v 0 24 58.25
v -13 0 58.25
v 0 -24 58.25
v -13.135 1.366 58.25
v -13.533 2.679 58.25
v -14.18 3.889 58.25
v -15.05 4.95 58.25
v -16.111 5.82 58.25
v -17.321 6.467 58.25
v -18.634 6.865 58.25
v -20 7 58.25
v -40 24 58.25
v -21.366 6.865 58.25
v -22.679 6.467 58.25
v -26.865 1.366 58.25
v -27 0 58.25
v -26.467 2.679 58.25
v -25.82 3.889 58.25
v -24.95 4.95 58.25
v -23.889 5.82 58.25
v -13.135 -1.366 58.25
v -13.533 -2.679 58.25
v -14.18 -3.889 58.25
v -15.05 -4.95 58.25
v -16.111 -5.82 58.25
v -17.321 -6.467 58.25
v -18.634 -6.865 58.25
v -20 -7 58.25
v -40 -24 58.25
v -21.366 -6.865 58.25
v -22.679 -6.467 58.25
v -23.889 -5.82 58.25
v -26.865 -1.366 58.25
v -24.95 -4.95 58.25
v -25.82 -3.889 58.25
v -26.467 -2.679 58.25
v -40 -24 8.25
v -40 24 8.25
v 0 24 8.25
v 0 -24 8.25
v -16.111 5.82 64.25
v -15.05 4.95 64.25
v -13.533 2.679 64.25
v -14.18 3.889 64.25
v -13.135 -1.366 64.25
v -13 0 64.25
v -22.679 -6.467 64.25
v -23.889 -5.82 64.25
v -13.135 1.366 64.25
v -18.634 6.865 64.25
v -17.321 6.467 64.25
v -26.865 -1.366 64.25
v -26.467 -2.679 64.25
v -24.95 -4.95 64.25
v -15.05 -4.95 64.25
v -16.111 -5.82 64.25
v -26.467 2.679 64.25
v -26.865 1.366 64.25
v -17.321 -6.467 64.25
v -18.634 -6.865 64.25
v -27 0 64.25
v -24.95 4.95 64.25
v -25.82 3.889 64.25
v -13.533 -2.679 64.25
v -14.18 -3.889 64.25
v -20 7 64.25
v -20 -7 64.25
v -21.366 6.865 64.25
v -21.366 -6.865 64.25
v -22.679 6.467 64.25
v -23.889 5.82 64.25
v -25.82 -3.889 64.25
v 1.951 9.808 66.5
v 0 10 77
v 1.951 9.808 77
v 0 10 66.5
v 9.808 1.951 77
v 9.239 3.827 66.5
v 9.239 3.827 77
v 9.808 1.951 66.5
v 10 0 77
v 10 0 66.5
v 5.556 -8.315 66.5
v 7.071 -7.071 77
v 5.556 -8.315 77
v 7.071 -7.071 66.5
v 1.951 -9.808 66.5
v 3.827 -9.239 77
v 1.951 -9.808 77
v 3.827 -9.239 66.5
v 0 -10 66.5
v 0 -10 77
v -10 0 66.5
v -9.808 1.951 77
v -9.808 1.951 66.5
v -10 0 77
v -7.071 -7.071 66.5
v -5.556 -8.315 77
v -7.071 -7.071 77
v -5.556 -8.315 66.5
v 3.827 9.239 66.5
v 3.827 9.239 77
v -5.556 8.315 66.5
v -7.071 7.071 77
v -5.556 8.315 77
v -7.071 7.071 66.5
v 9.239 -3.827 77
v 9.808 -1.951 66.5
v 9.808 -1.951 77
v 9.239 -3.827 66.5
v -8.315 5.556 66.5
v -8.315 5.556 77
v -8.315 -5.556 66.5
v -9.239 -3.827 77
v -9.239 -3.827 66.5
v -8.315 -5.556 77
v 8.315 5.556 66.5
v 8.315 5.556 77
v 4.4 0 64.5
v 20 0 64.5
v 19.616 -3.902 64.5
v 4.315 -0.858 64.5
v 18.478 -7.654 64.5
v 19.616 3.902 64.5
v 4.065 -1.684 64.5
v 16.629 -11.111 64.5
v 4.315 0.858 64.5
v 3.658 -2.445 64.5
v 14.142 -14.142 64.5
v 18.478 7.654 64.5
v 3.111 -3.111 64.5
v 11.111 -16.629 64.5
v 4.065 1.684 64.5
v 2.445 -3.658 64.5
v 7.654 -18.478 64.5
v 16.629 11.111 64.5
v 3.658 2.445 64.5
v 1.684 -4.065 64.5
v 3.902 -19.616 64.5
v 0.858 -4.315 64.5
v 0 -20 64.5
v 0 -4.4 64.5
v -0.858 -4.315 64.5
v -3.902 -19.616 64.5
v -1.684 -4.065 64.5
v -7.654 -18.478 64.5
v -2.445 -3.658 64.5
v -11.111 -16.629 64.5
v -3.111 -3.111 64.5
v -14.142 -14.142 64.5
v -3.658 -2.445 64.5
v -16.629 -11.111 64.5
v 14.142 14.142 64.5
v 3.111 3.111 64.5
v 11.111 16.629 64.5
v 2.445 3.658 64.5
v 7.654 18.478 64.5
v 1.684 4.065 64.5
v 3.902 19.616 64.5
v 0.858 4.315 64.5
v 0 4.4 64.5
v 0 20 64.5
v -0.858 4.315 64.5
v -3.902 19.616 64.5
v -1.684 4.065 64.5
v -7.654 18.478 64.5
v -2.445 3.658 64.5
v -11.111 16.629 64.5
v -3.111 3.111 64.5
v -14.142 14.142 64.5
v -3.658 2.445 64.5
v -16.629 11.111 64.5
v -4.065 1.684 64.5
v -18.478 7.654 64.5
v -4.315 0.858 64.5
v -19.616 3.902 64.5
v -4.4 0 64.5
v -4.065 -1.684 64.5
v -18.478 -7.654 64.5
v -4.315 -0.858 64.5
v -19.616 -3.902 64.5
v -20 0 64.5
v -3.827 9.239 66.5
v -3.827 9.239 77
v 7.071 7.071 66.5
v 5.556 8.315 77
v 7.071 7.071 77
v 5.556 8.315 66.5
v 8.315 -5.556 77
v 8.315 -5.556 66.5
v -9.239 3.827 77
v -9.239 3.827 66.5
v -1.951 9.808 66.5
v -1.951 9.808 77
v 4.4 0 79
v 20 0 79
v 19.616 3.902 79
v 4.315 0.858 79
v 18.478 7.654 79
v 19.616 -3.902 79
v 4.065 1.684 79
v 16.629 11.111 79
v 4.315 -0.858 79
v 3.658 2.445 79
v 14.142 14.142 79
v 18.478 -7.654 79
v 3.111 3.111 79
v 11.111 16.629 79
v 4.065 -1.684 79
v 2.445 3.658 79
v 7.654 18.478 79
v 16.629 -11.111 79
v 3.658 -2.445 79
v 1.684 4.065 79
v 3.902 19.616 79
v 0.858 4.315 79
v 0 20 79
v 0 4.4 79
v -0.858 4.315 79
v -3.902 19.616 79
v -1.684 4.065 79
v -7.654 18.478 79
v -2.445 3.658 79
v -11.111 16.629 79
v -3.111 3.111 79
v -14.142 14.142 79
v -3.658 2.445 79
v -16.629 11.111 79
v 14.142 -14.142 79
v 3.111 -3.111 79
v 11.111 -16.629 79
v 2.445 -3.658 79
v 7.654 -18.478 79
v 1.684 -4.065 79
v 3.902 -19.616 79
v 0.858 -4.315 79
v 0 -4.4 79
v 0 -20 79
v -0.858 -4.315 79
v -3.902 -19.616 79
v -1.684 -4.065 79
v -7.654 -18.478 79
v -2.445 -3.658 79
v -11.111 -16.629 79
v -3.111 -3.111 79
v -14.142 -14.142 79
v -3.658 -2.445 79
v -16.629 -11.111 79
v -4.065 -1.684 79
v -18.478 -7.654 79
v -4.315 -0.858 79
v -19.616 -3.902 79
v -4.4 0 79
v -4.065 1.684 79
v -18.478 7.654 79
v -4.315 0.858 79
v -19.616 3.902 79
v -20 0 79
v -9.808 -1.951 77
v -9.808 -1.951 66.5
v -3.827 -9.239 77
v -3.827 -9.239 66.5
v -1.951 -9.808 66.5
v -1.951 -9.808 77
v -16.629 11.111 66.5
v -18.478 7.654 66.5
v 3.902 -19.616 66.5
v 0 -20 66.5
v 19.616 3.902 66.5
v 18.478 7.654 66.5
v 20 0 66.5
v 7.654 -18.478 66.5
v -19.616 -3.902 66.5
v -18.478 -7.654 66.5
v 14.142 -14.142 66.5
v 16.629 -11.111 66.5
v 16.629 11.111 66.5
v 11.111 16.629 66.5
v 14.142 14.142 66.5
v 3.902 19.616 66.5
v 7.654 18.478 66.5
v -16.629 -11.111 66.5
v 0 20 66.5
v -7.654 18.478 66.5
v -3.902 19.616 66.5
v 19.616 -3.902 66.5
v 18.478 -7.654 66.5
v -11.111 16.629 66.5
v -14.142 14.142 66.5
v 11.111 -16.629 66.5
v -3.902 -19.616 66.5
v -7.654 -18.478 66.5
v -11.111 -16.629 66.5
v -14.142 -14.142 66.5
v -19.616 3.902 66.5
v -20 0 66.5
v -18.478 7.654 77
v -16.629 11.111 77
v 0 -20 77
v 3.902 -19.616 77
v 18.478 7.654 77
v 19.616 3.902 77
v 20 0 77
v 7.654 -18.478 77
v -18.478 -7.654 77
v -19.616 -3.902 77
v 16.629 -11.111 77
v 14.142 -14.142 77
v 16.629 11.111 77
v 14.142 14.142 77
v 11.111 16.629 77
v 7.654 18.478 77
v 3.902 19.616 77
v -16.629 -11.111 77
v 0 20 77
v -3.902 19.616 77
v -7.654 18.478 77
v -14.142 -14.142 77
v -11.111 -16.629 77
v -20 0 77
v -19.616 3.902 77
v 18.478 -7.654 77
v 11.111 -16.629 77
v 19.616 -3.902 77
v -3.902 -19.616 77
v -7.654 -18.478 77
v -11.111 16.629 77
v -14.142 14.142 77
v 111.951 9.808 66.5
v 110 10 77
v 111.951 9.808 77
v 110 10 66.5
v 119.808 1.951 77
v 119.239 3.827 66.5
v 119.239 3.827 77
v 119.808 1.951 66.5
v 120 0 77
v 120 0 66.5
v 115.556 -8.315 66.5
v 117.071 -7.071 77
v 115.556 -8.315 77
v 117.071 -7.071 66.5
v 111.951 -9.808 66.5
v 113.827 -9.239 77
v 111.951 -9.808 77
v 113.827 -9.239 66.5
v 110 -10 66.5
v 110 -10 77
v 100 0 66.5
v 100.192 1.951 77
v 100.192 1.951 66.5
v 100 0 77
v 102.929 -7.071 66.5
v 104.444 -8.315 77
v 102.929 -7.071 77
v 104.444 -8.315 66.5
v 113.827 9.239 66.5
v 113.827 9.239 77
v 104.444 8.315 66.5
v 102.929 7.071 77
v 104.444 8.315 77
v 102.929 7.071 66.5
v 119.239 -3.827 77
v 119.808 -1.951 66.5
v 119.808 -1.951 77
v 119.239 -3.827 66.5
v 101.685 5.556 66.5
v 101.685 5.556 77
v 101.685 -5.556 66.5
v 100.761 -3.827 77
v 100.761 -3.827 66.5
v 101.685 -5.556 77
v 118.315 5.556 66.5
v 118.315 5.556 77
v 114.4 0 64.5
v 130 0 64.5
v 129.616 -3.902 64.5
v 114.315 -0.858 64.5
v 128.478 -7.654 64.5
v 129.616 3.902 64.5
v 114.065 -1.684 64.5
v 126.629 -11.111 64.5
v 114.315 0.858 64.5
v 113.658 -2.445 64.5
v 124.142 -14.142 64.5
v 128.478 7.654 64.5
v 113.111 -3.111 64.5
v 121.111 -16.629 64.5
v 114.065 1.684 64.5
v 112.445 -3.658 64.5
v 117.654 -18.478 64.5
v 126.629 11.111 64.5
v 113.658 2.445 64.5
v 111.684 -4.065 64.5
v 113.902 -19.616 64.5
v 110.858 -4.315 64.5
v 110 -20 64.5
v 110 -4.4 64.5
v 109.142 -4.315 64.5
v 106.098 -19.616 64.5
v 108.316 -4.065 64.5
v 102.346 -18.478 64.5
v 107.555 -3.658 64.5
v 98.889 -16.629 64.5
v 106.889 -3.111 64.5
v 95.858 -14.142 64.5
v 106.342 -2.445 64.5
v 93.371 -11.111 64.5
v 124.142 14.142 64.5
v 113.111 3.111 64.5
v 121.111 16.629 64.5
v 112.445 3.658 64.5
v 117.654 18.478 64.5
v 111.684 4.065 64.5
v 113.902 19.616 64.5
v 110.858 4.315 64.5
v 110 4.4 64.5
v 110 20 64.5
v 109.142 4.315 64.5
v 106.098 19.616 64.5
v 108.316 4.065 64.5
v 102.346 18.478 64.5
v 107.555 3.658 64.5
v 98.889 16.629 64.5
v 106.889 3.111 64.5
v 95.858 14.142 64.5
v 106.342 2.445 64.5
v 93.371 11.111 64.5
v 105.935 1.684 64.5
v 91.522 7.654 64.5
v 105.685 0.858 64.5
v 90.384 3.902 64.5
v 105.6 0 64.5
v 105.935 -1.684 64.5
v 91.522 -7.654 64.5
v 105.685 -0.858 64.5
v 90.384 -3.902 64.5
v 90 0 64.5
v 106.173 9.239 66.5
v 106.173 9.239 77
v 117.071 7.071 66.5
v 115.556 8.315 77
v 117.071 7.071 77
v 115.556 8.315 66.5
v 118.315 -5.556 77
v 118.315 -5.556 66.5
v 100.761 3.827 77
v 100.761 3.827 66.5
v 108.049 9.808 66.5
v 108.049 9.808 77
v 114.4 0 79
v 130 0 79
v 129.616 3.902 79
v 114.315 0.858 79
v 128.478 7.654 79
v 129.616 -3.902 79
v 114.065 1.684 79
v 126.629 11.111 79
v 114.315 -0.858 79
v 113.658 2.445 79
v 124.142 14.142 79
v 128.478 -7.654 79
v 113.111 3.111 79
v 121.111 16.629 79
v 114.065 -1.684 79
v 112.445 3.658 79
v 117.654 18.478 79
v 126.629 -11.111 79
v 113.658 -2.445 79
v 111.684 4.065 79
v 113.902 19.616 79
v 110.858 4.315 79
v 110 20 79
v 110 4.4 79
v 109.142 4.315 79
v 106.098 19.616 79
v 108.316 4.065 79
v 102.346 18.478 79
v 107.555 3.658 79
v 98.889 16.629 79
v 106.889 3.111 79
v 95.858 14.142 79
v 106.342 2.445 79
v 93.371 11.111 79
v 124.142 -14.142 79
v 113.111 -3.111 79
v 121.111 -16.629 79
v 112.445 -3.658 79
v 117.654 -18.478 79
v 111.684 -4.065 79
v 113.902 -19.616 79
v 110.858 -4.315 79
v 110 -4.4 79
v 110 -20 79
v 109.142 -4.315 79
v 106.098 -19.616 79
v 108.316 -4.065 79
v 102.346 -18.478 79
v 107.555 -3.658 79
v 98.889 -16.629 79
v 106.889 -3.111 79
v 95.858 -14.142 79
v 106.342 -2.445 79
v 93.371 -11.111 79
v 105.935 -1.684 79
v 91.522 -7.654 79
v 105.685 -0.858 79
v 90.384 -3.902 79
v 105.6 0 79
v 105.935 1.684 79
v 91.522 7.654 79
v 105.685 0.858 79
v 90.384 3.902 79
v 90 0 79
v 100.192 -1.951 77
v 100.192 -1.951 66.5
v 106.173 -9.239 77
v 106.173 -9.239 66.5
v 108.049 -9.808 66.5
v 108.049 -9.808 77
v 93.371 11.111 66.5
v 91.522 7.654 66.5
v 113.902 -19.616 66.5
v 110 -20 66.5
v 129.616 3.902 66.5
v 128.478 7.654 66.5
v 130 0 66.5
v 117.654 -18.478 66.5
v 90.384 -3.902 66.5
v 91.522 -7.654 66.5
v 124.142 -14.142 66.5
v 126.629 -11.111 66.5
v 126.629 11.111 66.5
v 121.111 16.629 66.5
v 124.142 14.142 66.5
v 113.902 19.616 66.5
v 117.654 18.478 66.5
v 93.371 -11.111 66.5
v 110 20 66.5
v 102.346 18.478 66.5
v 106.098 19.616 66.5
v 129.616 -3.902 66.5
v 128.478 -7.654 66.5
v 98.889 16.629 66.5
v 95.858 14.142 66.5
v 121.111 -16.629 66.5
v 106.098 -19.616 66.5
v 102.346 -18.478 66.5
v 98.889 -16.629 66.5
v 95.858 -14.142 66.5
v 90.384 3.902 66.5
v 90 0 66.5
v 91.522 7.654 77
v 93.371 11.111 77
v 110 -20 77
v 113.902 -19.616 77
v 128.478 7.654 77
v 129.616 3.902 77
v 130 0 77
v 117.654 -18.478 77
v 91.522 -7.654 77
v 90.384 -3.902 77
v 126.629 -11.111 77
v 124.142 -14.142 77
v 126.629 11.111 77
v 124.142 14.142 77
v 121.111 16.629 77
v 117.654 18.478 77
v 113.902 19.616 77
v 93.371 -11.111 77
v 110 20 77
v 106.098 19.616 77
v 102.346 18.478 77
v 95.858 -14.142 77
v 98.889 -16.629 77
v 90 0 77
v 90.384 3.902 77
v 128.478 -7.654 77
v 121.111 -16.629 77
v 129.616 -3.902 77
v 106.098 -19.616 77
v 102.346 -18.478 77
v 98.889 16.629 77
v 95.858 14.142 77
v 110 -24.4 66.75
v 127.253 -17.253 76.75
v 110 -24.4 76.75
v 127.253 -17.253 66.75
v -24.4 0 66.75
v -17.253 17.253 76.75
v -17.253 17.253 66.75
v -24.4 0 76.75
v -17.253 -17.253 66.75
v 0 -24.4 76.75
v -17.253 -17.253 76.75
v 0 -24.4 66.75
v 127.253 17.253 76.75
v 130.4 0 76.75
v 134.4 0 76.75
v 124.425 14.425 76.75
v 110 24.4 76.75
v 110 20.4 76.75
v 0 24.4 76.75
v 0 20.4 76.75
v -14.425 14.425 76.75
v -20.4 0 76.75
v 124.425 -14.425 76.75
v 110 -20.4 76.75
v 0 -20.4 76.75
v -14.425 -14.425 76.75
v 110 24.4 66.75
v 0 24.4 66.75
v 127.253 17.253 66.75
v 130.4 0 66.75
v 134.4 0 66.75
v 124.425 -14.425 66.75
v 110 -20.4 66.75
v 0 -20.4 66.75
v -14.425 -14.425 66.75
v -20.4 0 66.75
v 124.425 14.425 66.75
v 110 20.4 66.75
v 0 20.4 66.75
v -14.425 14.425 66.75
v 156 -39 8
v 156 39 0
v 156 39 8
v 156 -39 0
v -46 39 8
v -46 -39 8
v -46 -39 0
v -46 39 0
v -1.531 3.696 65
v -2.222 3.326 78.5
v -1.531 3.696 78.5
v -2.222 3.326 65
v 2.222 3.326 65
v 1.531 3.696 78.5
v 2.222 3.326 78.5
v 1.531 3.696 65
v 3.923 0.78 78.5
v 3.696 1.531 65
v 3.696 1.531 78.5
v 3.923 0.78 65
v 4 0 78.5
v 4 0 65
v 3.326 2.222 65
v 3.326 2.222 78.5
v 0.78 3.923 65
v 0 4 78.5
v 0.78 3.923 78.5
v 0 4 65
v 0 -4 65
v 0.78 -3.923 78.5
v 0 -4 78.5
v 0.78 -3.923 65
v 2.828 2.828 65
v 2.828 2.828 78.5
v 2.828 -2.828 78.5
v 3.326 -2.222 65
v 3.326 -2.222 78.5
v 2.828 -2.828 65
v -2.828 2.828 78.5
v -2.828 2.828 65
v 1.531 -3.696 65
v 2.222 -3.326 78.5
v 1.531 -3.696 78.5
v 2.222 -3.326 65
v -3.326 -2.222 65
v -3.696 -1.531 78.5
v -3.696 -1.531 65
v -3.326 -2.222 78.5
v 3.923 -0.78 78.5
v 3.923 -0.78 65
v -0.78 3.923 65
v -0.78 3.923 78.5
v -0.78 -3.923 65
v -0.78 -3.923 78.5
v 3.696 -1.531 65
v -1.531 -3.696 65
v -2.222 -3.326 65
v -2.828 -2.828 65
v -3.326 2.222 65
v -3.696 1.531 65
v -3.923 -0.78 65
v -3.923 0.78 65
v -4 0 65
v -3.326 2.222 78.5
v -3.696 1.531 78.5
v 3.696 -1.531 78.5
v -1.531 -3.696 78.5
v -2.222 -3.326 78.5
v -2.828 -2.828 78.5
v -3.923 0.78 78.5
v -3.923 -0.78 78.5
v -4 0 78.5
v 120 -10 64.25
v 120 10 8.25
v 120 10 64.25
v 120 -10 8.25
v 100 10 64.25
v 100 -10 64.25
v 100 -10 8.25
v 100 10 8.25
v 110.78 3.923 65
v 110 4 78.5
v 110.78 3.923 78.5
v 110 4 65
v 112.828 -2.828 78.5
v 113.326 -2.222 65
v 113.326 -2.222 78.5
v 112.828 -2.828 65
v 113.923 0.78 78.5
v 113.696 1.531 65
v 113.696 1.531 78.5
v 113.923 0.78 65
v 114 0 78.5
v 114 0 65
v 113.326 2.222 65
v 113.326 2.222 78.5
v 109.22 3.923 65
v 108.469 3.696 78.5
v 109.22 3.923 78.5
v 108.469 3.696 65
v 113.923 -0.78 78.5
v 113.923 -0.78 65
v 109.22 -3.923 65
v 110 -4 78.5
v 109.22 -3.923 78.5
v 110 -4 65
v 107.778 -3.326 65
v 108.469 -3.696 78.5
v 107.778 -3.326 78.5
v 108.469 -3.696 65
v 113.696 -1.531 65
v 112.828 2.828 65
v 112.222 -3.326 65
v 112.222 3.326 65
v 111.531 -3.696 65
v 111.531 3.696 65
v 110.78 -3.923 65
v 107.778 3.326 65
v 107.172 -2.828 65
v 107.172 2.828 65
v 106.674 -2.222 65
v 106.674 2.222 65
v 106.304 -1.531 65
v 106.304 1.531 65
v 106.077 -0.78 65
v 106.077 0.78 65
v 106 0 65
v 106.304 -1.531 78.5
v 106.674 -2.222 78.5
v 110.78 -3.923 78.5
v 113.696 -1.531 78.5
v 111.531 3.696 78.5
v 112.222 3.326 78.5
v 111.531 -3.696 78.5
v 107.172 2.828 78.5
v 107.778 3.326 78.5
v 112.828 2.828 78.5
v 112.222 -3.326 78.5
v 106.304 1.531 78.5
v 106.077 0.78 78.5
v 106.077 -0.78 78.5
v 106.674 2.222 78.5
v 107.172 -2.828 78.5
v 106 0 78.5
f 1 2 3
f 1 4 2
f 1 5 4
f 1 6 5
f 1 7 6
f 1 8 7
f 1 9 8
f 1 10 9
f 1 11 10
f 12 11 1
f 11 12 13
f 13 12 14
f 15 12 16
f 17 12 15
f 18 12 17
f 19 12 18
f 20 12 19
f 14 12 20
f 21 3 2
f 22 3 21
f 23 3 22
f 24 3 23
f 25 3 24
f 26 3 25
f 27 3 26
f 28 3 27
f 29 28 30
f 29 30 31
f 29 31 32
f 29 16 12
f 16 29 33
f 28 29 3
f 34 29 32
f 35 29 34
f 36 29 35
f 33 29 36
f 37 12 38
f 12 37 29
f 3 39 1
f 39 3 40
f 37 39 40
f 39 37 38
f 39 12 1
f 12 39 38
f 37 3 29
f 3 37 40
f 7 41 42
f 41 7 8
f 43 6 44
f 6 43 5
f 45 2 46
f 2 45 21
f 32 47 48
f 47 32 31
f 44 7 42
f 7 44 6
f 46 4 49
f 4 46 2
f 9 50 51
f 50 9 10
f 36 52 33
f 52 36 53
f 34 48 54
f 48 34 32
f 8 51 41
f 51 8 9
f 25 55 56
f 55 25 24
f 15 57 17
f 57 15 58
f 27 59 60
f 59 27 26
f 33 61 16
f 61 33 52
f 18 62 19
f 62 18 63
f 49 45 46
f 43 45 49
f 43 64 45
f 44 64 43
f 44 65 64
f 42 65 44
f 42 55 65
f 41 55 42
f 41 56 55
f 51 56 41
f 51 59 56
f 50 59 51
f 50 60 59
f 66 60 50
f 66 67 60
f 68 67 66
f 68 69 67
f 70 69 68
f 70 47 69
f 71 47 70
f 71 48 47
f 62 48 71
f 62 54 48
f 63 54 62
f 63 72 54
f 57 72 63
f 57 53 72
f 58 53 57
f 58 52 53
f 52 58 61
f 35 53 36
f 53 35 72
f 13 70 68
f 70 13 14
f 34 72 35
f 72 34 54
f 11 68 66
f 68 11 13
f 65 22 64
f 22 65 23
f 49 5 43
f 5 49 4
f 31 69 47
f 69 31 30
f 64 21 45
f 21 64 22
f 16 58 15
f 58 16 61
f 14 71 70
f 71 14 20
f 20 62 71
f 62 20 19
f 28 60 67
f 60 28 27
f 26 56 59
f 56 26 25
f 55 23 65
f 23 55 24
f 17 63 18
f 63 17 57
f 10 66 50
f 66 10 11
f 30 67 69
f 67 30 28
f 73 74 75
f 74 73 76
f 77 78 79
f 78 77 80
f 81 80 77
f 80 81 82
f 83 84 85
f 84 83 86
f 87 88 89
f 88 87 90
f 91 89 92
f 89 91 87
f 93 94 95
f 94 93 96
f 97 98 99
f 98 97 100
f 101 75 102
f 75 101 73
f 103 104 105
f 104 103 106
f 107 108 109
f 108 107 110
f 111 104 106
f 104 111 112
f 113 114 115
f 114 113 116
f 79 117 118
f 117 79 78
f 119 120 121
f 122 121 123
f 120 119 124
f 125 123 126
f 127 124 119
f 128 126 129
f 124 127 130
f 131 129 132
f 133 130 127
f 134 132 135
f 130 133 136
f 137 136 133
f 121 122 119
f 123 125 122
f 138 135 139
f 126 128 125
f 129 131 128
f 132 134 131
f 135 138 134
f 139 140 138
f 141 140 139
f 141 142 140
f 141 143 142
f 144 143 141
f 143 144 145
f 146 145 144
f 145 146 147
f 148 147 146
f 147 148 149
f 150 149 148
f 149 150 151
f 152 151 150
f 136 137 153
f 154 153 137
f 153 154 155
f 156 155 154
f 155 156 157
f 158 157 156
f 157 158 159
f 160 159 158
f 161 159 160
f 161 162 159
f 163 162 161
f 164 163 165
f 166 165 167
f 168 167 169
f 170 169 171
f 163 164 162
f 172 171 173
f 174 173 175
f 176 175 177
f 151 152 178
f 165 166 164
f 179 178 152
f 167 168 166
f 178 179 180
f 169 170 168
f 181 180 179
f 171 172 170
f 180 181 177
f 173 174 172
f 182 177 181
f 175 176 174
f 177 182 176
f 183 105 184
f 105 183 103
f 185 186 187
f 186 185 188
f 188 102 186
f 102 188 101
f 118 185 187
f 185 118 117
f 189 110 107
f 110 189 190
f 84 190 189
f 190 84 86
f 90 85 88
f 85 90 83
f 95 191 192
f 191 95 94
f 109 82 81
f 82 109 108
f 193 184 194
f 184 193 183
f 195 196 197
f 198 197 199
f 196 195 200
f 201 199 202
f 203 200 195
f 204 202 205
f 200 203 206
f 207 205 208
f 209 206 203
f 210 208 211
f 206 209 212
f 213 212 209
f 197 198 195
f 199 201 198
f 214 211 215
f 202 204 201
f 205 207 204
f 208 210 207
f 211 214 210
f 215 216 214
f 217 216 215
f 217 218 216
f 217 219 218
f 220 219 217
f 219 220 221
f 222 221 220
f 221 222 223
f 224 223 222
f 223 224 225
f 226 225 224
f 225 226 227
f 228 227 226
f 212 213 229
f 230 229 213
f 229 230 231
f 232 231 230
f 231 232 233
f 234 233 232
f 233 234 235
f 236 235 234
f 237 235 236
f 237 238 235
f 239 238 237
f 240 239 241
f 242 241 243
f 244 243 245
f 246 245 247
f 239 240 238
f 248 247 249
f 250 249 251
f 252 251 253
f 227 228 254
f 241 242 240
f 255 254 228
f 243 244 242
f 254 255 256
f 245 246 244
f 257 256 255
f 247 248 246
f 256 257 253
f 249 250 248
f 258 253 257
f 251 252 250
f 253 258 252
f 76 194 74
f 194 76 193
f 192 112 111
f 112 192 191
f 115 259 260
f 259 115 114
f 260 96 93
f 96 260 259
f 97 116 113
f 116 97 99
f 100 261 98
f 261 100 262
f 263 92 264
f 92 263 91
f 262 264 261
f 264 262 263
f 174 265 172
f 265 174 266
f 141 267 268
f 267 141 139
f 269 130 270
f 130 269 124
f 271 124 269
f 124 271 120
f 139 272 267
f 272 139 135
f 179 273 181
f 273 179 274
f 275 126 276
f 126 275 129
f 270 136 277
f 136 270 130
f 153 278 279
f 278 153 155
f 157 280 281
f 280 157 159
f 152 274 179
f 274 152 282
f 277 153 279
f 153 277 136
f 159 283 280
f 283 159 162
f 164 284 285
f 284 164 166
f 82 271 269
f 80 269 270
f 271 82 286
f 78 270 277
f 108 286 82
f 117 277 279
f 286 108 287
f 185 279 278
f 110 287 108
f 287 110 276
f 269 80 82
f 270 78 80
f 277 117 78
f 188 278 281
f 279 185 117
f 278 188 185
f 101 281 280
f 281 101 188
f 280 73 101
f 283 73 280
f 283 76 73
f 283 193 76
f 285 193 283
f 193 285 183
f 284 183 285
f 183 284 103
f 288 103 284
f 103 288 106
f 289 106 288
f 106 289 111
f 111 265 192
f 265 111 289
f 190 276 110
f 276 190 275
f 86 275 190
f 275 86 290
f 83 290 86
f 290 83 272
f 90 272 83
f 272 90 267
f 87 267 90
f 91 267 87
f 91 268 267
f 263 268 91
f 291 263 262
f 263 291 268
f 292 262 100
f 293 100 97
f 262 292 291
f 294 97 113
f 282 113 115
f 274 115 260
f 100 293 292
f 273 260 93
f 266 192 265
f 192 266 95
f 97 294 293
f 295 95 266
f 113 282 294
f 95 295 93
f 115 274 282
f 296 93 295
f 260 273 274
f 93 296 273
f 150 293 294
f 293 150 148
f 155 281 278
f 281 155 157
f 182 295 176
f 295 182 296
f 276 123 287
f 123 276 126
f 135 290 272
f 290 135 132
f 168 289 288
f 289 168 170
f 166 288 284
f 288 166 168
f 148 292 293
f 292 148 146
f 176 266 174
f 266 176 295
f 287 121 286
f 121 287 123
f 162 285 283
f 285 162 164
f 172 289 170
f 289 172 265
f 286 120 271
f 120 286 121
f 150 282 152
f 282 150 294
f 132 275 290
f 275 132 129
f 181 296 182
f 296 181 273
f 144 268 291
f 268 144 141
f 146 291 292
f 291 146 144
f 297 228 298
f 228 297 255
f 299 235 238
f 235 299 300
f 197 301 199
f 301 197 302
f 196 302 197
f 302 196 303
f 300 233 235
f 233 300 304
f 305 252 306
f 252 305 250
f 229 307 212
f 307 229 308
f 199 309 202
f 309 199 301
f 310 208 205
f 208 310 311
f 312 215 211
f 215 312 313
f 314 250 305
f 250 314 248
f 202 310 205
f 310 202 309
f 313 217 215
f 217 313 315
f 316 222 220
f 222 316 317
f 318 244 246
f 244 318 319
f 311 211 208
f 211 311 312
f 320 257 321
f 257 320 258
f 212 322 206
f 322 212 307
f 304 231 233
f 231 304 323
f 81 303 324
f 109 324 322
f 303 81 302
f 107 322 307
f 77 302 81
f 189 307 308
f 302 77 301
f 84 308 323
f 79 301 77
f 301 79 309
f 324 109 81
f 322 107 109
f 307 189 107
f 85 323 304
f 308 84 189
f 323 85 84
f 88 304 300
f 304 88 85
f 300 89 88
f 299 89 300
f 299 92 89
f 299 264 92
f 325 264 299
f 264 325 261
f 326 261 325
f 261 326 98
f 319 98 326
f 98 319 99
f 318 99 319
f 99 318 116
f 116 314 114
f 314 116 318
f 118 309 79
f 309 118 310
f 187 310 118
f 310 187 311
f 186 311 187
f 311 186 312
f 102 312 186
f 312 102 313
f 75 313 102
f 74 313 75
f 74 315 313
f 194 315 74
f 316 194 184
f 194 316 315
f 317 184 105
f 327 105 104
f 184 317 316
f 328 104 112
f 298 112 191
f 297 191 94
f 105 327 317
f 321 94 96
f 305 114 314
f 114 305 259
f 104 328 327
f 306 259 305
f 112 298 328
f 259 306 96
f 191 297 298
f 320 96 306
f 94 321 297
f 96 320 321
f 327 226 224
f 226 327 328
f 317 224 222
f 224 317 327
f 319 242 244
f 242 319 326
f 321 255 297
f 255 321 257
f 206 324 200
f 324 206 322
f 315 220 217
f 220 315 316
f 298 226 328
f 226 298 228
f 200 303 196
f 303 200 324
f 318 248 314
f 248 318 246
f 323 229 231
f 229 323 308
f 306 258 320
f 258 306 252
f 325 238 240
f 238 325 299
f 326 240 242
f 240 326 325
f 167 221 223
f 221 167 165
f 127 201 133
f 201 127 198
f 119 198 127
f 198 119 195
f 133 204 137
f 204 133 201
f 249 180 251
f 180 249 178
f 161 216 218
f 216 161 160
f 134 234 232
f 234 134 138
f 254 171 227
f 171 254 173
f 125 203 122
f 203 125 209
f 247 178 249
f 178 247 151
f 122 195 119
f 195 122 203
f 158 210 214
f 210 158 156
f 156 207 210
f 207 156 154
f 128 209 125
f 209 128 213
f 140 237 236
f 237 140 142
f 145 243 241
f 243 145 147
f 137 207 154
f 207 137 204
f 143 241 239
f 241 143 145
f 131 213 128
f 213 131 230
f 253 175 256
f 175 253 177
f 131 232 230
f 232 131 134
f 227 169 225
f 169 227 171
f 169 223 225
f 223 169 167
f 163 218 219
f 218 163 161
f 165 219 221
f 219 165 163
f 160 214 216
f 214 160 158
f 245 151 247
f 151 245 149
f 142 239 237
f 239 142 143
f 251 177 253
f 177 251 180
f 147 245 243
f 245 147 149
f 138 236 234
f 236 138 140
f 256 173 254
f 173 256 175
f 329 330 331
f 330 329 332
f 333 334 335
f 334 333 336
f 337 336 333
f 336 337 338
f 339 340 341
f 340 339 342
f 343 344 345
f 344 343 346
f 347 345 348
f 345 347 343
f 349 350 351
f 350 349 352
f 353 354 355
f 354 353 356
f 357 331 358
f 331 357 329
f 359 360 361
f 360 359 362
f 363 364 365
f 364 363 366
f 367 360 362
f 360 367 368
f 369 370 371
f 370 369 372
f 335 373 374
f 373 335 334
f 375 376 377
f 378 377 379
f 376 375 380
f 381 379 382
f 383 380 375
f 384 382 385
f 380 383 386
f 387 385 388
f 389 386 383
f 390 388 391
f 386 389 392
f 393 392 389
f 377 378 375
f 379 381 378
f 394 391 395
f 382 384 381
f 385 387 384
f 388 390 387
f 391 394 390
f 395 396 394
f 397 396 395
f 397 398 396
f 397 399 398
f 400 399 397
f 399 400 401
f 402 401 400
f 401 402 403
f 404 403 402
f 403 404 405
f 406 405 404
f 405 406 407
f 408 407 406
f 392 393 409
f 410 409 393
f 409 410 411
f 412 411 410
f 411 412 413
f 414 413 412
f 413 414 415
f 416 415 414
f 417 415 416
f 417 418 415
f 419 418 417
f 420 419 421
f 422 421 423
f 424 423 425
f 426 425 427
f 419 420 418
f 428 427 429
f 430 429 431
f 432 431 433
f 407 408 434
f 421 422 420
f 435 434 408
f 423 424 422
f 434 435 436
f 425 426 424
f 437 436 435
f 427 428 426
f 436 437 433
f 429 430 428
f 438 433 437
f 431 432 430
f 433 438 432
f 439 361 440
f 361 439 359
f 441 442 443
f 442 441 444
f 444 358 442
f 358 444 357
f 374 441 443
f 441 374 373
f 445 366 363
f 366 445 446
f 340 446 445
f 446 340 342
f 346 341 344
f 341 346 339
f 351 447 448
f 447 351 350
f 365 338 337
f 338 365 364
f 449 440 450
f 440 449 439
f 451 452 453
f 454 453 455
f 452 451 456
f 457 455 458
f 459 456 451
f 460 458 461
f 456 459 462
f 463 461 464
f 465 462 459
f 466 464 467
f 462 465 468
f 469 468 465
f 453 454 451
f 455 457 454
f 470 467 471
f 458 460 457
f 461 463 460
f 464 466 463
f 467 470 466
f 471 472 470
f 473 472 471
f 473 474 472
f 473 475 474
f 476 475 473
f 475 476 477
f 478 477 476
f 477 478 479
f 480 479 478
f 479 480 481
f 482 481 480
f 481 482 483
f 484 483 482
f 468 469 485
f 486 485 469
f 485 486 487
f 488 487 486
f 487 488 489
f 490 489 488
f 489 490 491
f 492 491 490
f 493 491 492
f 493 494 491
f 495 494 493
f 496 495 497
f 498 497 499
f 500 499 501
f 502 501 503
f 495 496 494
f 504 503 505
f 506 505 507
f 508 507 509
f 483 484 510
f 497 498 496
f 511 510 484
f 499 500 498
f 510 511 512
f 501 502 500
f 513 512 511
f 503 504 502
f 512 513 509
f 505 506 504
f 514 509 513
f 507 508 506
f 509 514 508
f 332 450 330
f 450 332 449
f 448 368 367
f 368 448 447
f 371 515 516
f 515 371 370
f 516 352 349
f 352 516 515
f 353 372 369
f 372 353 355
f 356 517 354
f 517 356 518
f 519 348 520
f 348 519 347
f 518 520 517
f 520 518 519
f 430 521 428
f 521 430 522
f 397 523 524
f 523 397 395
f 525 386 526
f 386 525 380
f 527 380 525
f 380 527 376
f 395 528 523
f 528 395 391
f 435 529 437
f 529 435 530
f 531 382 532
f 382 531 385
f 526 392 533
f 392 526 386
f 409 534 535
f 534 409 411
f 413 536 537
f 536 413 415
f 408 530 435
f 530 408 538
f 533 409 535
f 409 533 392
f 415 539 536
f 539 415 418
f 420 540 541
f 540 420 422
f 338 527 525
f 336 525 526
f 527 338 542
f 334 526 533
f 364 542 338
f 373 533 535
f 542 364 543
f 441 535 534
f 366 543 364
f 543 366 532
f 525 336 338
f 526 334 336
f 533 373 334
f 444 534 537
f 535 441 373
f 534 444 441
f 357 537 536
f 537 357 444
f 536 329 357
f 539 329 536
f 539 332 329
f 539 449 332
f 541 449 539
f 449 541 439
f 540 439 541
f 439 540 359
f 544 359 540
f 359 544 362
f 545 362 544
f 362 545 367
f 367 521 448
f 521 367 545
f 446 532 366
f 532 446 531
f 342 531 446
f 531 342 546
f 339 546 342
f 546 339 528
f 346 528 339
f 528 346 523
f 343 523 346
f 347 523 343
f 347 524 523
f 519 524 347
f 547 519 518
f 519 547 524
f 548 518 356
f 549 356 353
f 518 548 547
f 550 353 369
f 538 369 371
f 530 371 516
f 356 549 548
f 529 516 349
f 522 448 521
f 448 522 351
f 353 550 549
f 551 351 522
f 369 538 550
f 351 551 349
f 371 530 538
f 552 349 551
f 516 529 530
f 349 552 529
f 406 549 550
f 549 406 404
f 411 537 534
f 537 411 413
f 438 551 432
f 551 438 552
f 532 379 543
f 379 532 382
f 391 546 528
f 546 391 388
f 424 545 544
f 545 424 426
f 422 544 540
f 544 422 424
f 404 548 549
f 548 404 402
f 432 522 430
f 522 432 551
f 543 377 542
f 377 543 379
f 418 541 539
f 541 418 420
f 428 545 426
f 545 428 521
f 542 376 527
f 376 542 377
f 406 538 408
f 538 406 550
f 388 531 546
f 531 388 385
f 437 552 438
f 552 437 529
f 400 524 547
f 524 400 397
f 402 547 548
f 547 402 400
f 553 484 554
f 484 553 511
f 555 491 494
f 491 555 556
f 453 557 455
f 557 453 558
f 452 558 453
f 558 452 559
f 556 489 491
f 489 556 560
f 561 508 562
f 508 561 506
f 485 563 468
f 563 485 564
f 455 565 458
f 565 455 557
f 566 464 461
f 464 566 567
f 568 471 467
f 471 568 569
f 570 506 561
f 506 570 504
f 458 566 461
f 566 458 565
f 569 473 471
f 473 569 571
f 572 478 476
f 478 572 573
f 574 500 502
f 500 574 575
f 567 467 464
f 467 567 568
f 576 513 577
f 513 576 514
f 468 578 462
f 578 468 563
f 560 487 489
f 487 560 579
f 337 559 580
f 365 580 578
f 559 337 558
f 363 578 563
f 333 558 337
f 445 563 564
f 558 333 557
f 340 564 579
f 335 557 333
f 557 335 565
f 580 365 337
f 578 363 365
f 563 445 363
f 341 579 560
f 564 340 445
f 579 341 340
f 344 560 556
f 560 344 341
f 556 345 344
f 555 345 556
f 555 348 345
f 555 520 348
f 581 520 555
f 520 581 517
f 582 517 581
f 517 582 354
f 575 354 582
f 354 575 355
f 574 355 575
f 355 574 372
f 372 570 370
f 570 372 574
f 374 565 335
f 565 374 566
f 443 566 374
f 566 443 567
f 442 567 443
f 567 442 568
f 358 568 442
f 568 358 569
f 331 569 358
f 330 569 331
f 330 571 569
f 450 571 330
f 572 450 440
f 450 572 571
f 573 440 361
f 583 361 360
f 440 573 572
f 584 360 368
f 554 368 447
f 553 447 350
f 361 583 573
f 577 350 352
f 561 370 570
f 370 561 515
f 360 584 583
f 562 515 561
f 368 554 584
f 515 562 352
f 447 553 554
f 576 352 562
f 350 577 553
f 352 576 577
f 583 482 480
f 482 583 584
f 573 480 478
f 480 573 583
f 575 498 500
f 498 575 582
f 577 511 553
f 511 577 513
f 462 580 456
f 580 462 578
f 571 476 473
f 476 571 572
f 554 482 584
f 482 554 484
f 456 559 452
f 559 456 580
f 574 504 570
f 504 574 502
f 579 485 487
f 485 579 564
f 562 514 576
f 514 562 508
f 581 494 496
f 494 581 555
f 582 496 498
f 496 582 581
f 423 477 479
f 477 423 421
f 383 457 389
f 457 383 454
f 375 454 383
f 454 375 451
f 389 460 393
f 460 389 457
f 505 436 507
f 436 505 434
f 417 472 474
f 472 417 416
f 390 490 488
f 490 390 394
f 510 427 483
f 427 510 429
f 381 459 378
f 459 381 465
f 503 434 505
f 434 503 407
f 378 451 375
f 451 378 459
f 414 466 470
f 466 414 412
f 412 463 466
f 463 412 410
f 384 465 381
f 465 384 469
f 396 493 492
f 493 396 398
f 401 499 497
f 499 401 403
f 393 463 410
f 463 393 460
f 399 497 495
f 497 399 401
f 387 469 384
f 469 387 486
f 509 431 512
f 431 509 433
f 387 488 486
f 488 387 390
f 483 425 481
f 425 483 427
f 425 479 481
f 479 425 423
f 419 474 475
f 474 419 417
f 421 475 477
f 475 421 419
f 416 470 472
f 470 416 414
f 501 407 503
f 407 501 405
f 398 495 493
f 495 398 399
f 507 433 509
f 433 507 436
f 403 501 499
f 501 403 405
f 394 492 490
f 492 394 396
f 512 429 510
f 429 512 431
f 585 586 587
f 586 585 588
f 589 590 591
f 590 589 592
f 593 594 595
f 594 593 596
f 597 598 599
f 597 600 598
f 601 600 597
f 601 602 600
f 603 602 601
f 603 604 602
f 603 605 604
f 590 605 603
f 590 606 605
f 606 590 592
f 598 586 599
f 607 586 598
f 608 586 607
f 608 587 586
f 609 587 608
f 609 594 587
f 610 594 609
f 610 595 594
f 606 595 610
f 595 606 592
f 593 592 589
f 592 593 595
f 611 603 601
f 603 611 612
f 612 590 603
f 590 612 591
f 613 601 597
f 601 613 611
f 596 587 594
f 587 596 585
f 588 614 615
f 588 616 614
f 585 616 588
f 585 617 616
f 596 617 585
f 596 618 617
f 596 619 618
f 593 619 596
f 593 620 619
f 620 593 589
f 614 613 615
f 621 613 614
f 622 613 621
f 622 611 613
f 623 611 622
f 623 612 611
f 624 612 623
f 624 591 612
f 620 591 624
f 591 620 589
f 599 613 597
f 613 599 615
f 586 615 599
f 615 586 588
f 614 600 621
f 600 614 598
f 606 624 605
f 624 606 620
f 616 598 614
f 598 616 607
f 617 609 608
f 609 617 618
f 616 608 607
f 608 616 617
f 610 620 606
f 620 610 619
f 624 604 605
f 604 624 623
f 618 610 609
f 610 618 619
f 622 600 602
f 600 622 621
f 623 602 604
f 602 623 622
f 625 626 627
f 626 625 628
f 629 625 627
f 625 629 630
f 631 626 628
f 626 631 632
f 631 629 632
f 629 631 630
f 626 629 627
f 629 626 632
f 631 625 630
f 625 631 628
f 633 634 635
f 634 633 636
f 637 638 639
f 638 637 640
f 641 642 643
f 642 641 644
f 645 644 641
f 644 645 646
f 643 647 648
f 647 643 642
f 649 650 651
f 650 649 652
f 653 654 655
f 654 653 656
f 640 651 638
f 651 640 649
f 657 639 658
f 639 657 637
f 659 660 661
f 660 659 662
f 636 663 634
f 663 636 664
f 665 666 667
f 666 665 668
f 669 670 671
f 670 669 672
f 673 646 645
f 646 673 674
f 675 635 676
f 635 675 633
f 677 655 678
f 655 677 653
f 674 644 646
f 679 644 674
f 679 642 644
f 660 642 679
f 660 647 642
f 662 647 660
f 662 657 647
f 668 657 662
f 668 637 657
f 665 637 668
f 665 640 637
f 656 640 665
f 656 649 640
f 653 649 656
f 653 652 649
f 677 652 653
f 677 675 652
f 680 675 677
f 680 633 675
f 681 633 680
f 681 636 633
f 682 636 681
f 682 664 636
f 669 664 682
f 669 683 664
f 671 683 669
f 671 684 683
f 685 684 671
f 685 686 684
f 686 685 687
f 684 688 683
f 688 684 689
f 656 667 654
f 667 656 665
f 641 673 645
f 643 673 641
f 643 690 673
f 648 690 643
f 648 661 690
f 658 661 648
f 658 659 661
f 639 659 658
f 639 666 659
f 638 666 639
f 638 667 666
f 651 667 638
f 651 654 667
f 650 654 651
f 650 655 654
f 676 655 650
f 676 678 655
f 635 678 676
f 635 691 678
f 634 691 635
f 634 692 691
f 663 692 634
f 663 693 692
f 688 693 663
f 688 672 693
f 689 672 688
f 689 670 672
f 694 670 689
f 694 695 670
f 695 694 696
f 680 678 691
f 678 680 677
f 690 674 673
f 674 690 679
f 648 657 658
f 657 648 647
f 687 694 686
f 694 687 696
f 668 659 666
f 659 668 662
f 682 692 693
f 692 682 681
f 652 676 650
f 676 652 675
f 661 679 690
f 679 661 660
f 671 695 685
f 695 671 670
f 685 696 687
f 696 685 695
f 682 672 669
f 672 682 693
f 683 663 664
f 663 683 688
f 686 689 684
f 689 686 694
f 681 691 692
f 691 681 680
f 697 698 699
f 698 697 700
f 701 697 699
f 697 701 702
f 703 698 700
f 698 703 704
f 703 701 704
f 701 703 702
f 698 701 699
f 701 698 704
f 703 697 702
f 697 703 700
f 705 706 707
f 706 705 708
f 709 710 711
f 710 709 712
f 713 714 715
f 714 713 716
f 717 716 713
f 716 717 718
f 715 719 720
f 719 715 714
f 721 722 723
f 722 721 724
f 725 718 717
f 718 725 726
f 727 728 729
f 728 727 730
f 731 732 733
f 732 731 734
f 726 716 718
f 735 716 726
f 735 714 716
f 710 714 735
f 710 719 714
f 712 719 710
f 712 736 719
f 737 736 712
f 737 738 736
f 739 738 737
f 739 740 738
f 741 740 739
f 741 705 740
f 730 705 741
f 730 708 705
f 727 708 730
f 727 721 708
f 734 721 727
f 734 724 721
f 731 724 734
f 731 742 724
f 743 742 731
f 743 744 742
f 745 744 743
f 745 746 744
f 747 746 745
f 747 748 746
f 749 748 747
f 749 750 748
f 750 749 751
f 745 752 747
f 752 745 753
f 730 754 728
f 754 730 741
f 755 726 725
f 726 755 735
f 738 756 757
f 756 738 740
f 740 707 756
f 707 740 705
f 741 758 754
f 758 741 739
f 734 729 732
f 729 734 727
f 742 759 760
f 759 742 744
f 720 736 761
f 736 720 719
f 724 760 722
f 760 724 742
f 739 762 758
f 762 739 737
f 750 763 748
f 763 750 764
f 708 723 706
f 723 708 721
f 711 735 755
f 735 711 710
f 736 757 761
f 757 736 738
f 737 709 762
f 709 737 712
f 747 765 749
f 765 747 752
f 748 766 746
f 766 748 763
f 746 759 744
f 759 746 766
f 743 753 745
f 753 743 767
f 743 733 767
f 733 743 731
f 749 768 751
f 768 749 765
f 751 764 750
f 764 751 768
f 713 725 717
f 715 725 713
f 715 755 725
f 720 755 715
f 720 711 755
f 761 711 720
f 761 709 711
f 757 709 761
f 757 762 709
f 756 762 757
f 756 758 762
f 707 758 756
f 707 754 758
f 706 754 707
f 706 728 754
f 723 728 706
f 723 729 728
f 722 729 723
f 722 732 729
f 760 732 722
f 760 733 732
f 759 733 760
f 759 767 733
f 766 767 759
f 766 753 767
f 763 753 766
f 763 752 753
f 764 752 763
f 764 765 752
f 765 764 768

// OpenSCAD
$fn = 32;

// ------------------------------------------------------------------------
// Motor belt drive: span 110 mm, pulleys d40, belt 10 mm wide
// Every part is its own module, assembly() places every instance.
// ------------------------------------------------------------------------

// --- part 1 ---
module base_plate() {
  difference() {
    translate([-101, -39, 0]) cube([202, 78, 8]);
  }
}

// --- part 2 ---
module motor() {
  union() {
    translate([-25, -24, 0]) cube([50, 48, 40]);
    translate([28, 0, 20]) rotate([0, 90, 0]) cylinder(h = 6, d = 14, center = true);
  }
}

// --- part 3 ---
module drive_shaft() {
  translate([0, 0, -6.75]) cylinder(h = 13.5, d = 8);
}

// --- part 4 ---
module pulley_drive() {
  difference() {
    union() {
      cylinder(h = 14.5, d = 20);
      cylinder(h = 2, d = 40);
      translate([0, 0, 12.5]) cylinder(h = 2, d = 40);
    }
    translate([0, 0, -1]) cylinder(h = 16.5, d = 8.8);
  }
}

// --- part 5 ---
module idler_post() {
  translate([-10, -10, 0]) cube([20, 20, 56]);
}

// --- part 6 ---
module driven_shaft() {
  translate([0, 0, -6.75]) cylinder(h = 13.5, d = 8);
}

// --- part 7 ---
module pulley_driven() {
  difference() {
    union() {
      cylinder(h = 14.5, d = 20);
      cylinder(h = 2, d = 40);
      translate([0, 0, 12.5]) cylinder(h = 2, d = 40);
    }
    translate([0, 0, -1]) cylinder(h = 16.5, d = 8.8);
  }
}

// --- part 8 ---
module drive_belt() {
  difference() {
    linear_extrude(height = 10) polygon(points = concat([for (a = [90 : 45 : 270]) [24.4 * cos(a), 24.4 * sin(a)]], [for (a = [270 : 45 : 450]) [110 + 24.4 * cos(a), 24.4 * sin(a)]]));
    translate([0, 0, -1]) linear_extrude(height = 12) polygon(points = concat([for (a = [90 : 45 : 270]) [20.4 * cos(a), 20.4 * sin(a)]], [for (a = [270 : 45 : 450]) [110 + 20.4 * cos(a), 20.4 * sin(a)]]));
  }
}

// --- assembly ---
module assembly() {
  color([0.80, 0.24, 0.20]) translate([55, 0, 0]) rotate([0, 0, 0]) base_plate();
  color([0.20, 0.45, 0.75]) translate([0, 0, 33.25]) rotate([0, 270, 0]) motor();
  color([0.25, 0.62, 0.32]) translate([0, 0, 71.75]) rotate([0, 0, 0]) drive_shaft();
  color([0.92, 0.70, 0.18]) translate([0, 0, 64.5]) rotate([0, 0, 0]) pulley_drive();
  color([0.58, 0.35, 0.70]) translate([110, 0, 8.25]) rotate([0, 0, 0]) idler_post();
  color([0.16, 0.66, 0.66]) translate([110, 0, 71.75]) rotate([0, 0, 0]) driven_shaft();
  color([0.85, 0.48, 0.18]) translate([110, 0, 64.5]) rotate([0, 0, 0]) pulley_driven();
  color([0.55, 0.60, 0.65]) translate([0, 0, 66.75]) rotate([0, 0, 0]) drive_belt();
}

assembly();
